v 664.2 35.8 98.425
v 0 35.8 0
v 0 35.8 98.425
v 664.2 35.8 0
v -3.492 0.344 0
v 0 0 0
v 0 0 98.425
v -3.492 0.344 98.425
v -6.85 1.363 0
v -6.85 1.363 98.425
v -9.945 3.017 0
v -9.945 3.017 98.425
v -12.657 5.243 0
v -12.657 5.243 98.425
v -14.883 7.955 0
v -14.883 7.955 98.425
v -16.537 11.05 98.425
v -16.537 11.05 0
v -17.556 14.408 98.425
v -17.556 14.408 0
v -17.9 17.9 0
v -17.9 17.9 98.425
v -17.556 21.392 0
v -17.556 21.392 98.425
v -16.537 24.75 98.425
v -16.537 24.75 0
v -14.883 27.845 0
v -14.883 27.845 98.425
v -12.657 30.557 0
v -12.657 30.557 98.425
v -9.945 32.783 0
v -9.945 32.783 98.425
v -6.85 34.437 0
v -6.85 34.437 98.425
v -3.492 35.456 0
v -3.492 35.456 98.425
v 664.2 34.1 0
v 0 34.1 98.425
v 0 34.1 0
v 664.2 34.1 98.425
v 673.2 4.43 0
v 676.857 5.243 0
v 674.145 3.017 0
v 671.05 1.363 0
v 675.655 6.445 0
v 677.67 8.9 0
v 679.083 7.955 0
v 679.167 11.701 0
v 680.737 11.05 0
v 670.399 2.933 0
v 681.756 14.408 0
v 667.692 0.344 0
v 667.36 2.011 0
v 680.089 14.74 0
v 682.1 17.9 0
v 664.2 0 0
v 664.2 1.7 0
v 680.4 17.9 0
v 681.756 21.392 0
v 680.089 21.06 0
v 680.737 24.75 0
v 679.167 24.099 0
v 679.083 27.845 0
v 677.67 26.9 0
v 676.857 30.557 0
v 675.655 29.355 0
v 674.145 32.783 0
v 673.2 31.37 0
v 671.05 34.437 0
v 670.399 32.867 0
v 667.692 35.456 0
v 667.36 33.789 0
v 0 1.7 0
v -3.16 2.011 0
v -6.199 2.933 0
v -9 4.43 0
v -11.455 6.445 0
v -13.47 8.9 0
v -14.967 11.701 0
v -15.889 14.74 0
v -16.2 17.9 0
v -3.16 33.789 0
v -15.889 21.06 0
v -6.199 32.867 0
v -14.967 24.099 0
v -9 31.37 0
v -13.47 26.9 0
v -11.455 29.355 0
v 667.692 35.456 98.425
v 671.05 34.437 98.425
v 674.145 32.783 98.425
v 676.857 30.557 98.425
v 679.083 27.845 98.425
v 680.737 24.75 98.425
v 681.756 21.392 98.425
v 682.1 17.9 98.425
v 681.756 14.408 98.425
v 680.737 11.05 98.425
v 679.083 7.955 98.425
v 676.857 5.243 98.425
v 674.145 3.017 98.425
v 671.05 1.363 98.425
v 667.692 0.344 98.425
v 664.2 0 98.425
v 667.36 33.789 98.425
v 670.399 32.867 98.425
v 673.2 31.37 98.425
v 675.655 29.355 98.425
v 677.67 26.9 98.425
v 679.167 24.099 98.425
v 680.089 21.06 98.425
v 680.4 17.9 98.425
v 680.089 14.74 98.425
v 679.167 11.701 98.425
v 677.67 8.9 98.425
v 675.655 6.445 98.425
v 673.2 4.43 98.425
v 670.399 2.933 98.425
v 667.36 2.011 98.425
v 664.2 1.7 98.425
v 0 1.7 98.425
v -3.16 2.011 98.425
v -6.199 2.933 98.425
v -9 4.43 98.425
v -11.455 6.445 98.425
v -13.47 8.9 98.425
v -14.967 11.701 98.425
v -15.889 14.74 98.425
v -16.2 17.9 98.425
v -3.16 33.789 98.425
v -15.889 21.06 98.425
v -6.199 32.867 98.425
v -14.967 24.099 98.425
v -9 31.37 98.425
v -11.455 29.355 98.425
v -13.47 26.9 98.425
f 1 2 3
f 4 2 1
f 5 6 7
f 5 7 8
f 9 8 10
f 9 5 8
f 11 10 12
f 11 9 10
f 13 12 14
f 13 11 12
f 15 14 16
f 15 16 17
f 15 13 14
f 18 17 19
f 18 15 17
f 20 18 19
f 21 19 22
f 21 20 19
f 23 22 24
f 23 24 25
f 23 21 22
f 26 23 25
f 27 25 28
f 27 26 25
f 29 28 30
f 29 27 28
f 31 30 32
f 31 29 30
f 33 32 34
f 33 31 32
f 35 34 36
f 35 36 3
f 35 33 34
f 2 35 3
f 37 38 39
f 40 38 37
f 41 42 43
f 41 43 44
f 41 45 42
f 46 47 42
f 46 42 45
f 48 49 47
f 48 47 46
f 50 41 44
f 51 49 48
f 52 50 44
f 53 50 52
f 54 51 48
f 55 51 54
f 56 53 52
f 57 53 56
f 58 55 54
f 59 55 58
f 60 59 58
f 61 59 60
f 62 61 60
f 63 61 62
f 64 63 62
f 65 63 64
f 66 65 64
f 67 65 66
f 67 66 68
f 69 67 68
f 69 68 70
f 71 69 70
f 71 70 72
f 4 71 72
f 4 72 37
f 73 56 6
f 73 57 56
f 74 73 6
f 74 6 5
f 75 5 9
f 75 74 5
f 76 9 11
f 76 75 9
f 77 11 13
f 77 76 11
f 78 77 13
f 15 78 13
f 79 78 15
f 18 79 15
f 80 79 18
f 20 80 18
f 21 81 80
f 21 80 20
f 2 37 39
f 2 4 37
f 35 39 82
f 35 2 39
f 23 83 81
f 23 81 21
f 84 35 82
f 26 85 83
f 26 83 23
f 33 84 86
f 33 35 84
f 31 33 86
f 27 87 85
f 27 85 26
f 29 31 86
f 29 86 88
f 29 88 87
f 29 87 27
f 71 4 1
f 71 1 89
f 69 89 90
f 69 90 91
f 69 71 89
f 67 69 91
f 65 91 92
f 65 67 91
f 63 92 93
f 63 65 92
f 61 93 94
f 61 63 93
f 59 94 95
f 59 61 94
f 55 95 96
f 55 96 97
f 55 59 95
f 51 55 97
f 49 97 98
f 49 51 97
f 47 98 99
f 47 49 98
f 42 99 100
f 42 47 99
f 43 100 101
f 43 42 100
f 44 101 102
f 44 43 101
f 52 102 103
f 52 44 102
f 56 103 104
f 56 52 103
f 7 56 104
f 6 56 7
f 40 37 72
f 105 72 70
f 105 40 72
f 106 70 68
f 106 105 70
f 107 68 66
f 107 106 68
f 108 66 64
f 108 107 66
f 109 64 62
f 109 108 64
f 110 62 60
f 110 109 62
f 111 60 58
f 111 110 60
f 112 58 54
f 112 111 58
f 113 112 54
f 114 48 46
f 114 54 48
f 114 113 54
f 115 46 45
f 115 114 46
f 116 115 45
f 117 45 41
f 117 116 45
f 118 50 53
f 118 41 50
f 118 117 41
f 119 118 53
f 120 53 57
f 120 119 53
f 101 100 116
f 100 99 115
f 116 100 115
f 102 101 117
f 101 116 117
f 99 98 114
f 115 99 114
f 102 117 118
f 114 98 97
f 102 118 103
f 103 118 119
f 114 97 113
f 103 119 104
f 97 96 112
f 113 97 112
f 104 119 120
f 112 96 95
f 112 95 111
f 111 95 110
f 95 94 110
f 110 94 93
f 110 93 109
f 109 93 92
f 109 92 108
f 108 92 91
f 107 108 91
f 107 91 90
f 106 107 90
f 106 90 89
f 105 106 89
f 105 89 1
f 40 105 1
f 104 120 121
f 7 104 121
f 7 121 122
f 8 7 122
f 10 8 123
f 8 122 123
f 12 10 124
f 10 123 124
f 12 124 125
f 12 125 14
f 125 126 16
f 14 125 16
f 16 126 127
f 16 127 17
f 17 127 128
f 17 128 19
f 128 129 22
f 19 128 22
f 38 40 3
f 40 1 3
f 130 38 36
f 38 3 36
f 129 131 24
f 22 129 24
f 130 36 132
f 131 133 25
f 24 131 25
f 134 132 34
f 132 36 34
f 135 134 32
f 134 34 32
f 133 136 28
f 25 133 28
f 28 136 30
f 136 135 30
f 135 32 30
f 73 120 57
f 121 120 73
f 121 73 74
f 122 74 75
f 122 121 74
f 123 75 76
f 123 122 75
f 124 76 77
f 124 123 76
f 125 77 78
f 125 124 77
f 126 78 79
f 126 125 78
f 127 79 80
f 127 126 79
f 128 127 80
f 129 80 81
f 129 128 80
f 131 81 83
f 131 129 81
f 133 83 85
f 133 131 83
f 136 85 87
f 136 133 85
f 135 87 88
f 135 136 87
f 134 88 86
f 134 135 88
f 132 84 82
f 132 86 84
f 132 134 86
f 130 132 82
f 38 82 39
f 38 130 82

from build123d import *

# Parameters (mm, degrees)
BOSS_EXTRUDE1_DEPTH = 98.425
CUT_EXTRUDE1_REACH  = 692.094


with BuildPart() as part:
    # Sketch1 → Boss-Extrude1 (new body)
    with BuildSketch(Plane.XY):
        with BuildLine():
            Line((0, 35.8), (664.20000002, 35.8))
            ThreePointArc((664.20000002, 35.8), (682.10000002, 17.9), (664.20000002, 0))
            Line((664.20000002, 0), (0, 0))
            ThreePointArc((0, 0), (-17.9, 17.9), (0, 35.8))
        make_face()
    extrude(amount=BOSS_EXTRUDE1_DEPTH)

    # Sketch3 → Cut-Extrude1 (cut, up to next)
    with BuildSketch(Plane.XY.offset(98.425), mode=Mode.PRIVATE) as cut_extrude1_sk1:
        with BuildLine():
            Line((0, 34.1), (664.20000002, 34.1))
            ThreePointArc((664.20000002, 34.1), (680.40000002, 17.9), (664.20000002, 1.7))
            Line((664.20000002, 1.7), (0, 1.7))
            ThreePointArc((0, 1.7), (-16.2, 17.9), (0, 34.1))
        make_face()
    cut_extrude1_tool1 = extrude(cut_extrude1_sk1.sketch, amount=-CUT_EXTRUDE1_REACH, mode=Mode.PRIVATE) & part.part
    add(cut_extrude1_tool1.solids().sort_by_distance((332.1, 17.9, 98.425))[0], mode=Mode.SUBTRACT)


solid = part.part
